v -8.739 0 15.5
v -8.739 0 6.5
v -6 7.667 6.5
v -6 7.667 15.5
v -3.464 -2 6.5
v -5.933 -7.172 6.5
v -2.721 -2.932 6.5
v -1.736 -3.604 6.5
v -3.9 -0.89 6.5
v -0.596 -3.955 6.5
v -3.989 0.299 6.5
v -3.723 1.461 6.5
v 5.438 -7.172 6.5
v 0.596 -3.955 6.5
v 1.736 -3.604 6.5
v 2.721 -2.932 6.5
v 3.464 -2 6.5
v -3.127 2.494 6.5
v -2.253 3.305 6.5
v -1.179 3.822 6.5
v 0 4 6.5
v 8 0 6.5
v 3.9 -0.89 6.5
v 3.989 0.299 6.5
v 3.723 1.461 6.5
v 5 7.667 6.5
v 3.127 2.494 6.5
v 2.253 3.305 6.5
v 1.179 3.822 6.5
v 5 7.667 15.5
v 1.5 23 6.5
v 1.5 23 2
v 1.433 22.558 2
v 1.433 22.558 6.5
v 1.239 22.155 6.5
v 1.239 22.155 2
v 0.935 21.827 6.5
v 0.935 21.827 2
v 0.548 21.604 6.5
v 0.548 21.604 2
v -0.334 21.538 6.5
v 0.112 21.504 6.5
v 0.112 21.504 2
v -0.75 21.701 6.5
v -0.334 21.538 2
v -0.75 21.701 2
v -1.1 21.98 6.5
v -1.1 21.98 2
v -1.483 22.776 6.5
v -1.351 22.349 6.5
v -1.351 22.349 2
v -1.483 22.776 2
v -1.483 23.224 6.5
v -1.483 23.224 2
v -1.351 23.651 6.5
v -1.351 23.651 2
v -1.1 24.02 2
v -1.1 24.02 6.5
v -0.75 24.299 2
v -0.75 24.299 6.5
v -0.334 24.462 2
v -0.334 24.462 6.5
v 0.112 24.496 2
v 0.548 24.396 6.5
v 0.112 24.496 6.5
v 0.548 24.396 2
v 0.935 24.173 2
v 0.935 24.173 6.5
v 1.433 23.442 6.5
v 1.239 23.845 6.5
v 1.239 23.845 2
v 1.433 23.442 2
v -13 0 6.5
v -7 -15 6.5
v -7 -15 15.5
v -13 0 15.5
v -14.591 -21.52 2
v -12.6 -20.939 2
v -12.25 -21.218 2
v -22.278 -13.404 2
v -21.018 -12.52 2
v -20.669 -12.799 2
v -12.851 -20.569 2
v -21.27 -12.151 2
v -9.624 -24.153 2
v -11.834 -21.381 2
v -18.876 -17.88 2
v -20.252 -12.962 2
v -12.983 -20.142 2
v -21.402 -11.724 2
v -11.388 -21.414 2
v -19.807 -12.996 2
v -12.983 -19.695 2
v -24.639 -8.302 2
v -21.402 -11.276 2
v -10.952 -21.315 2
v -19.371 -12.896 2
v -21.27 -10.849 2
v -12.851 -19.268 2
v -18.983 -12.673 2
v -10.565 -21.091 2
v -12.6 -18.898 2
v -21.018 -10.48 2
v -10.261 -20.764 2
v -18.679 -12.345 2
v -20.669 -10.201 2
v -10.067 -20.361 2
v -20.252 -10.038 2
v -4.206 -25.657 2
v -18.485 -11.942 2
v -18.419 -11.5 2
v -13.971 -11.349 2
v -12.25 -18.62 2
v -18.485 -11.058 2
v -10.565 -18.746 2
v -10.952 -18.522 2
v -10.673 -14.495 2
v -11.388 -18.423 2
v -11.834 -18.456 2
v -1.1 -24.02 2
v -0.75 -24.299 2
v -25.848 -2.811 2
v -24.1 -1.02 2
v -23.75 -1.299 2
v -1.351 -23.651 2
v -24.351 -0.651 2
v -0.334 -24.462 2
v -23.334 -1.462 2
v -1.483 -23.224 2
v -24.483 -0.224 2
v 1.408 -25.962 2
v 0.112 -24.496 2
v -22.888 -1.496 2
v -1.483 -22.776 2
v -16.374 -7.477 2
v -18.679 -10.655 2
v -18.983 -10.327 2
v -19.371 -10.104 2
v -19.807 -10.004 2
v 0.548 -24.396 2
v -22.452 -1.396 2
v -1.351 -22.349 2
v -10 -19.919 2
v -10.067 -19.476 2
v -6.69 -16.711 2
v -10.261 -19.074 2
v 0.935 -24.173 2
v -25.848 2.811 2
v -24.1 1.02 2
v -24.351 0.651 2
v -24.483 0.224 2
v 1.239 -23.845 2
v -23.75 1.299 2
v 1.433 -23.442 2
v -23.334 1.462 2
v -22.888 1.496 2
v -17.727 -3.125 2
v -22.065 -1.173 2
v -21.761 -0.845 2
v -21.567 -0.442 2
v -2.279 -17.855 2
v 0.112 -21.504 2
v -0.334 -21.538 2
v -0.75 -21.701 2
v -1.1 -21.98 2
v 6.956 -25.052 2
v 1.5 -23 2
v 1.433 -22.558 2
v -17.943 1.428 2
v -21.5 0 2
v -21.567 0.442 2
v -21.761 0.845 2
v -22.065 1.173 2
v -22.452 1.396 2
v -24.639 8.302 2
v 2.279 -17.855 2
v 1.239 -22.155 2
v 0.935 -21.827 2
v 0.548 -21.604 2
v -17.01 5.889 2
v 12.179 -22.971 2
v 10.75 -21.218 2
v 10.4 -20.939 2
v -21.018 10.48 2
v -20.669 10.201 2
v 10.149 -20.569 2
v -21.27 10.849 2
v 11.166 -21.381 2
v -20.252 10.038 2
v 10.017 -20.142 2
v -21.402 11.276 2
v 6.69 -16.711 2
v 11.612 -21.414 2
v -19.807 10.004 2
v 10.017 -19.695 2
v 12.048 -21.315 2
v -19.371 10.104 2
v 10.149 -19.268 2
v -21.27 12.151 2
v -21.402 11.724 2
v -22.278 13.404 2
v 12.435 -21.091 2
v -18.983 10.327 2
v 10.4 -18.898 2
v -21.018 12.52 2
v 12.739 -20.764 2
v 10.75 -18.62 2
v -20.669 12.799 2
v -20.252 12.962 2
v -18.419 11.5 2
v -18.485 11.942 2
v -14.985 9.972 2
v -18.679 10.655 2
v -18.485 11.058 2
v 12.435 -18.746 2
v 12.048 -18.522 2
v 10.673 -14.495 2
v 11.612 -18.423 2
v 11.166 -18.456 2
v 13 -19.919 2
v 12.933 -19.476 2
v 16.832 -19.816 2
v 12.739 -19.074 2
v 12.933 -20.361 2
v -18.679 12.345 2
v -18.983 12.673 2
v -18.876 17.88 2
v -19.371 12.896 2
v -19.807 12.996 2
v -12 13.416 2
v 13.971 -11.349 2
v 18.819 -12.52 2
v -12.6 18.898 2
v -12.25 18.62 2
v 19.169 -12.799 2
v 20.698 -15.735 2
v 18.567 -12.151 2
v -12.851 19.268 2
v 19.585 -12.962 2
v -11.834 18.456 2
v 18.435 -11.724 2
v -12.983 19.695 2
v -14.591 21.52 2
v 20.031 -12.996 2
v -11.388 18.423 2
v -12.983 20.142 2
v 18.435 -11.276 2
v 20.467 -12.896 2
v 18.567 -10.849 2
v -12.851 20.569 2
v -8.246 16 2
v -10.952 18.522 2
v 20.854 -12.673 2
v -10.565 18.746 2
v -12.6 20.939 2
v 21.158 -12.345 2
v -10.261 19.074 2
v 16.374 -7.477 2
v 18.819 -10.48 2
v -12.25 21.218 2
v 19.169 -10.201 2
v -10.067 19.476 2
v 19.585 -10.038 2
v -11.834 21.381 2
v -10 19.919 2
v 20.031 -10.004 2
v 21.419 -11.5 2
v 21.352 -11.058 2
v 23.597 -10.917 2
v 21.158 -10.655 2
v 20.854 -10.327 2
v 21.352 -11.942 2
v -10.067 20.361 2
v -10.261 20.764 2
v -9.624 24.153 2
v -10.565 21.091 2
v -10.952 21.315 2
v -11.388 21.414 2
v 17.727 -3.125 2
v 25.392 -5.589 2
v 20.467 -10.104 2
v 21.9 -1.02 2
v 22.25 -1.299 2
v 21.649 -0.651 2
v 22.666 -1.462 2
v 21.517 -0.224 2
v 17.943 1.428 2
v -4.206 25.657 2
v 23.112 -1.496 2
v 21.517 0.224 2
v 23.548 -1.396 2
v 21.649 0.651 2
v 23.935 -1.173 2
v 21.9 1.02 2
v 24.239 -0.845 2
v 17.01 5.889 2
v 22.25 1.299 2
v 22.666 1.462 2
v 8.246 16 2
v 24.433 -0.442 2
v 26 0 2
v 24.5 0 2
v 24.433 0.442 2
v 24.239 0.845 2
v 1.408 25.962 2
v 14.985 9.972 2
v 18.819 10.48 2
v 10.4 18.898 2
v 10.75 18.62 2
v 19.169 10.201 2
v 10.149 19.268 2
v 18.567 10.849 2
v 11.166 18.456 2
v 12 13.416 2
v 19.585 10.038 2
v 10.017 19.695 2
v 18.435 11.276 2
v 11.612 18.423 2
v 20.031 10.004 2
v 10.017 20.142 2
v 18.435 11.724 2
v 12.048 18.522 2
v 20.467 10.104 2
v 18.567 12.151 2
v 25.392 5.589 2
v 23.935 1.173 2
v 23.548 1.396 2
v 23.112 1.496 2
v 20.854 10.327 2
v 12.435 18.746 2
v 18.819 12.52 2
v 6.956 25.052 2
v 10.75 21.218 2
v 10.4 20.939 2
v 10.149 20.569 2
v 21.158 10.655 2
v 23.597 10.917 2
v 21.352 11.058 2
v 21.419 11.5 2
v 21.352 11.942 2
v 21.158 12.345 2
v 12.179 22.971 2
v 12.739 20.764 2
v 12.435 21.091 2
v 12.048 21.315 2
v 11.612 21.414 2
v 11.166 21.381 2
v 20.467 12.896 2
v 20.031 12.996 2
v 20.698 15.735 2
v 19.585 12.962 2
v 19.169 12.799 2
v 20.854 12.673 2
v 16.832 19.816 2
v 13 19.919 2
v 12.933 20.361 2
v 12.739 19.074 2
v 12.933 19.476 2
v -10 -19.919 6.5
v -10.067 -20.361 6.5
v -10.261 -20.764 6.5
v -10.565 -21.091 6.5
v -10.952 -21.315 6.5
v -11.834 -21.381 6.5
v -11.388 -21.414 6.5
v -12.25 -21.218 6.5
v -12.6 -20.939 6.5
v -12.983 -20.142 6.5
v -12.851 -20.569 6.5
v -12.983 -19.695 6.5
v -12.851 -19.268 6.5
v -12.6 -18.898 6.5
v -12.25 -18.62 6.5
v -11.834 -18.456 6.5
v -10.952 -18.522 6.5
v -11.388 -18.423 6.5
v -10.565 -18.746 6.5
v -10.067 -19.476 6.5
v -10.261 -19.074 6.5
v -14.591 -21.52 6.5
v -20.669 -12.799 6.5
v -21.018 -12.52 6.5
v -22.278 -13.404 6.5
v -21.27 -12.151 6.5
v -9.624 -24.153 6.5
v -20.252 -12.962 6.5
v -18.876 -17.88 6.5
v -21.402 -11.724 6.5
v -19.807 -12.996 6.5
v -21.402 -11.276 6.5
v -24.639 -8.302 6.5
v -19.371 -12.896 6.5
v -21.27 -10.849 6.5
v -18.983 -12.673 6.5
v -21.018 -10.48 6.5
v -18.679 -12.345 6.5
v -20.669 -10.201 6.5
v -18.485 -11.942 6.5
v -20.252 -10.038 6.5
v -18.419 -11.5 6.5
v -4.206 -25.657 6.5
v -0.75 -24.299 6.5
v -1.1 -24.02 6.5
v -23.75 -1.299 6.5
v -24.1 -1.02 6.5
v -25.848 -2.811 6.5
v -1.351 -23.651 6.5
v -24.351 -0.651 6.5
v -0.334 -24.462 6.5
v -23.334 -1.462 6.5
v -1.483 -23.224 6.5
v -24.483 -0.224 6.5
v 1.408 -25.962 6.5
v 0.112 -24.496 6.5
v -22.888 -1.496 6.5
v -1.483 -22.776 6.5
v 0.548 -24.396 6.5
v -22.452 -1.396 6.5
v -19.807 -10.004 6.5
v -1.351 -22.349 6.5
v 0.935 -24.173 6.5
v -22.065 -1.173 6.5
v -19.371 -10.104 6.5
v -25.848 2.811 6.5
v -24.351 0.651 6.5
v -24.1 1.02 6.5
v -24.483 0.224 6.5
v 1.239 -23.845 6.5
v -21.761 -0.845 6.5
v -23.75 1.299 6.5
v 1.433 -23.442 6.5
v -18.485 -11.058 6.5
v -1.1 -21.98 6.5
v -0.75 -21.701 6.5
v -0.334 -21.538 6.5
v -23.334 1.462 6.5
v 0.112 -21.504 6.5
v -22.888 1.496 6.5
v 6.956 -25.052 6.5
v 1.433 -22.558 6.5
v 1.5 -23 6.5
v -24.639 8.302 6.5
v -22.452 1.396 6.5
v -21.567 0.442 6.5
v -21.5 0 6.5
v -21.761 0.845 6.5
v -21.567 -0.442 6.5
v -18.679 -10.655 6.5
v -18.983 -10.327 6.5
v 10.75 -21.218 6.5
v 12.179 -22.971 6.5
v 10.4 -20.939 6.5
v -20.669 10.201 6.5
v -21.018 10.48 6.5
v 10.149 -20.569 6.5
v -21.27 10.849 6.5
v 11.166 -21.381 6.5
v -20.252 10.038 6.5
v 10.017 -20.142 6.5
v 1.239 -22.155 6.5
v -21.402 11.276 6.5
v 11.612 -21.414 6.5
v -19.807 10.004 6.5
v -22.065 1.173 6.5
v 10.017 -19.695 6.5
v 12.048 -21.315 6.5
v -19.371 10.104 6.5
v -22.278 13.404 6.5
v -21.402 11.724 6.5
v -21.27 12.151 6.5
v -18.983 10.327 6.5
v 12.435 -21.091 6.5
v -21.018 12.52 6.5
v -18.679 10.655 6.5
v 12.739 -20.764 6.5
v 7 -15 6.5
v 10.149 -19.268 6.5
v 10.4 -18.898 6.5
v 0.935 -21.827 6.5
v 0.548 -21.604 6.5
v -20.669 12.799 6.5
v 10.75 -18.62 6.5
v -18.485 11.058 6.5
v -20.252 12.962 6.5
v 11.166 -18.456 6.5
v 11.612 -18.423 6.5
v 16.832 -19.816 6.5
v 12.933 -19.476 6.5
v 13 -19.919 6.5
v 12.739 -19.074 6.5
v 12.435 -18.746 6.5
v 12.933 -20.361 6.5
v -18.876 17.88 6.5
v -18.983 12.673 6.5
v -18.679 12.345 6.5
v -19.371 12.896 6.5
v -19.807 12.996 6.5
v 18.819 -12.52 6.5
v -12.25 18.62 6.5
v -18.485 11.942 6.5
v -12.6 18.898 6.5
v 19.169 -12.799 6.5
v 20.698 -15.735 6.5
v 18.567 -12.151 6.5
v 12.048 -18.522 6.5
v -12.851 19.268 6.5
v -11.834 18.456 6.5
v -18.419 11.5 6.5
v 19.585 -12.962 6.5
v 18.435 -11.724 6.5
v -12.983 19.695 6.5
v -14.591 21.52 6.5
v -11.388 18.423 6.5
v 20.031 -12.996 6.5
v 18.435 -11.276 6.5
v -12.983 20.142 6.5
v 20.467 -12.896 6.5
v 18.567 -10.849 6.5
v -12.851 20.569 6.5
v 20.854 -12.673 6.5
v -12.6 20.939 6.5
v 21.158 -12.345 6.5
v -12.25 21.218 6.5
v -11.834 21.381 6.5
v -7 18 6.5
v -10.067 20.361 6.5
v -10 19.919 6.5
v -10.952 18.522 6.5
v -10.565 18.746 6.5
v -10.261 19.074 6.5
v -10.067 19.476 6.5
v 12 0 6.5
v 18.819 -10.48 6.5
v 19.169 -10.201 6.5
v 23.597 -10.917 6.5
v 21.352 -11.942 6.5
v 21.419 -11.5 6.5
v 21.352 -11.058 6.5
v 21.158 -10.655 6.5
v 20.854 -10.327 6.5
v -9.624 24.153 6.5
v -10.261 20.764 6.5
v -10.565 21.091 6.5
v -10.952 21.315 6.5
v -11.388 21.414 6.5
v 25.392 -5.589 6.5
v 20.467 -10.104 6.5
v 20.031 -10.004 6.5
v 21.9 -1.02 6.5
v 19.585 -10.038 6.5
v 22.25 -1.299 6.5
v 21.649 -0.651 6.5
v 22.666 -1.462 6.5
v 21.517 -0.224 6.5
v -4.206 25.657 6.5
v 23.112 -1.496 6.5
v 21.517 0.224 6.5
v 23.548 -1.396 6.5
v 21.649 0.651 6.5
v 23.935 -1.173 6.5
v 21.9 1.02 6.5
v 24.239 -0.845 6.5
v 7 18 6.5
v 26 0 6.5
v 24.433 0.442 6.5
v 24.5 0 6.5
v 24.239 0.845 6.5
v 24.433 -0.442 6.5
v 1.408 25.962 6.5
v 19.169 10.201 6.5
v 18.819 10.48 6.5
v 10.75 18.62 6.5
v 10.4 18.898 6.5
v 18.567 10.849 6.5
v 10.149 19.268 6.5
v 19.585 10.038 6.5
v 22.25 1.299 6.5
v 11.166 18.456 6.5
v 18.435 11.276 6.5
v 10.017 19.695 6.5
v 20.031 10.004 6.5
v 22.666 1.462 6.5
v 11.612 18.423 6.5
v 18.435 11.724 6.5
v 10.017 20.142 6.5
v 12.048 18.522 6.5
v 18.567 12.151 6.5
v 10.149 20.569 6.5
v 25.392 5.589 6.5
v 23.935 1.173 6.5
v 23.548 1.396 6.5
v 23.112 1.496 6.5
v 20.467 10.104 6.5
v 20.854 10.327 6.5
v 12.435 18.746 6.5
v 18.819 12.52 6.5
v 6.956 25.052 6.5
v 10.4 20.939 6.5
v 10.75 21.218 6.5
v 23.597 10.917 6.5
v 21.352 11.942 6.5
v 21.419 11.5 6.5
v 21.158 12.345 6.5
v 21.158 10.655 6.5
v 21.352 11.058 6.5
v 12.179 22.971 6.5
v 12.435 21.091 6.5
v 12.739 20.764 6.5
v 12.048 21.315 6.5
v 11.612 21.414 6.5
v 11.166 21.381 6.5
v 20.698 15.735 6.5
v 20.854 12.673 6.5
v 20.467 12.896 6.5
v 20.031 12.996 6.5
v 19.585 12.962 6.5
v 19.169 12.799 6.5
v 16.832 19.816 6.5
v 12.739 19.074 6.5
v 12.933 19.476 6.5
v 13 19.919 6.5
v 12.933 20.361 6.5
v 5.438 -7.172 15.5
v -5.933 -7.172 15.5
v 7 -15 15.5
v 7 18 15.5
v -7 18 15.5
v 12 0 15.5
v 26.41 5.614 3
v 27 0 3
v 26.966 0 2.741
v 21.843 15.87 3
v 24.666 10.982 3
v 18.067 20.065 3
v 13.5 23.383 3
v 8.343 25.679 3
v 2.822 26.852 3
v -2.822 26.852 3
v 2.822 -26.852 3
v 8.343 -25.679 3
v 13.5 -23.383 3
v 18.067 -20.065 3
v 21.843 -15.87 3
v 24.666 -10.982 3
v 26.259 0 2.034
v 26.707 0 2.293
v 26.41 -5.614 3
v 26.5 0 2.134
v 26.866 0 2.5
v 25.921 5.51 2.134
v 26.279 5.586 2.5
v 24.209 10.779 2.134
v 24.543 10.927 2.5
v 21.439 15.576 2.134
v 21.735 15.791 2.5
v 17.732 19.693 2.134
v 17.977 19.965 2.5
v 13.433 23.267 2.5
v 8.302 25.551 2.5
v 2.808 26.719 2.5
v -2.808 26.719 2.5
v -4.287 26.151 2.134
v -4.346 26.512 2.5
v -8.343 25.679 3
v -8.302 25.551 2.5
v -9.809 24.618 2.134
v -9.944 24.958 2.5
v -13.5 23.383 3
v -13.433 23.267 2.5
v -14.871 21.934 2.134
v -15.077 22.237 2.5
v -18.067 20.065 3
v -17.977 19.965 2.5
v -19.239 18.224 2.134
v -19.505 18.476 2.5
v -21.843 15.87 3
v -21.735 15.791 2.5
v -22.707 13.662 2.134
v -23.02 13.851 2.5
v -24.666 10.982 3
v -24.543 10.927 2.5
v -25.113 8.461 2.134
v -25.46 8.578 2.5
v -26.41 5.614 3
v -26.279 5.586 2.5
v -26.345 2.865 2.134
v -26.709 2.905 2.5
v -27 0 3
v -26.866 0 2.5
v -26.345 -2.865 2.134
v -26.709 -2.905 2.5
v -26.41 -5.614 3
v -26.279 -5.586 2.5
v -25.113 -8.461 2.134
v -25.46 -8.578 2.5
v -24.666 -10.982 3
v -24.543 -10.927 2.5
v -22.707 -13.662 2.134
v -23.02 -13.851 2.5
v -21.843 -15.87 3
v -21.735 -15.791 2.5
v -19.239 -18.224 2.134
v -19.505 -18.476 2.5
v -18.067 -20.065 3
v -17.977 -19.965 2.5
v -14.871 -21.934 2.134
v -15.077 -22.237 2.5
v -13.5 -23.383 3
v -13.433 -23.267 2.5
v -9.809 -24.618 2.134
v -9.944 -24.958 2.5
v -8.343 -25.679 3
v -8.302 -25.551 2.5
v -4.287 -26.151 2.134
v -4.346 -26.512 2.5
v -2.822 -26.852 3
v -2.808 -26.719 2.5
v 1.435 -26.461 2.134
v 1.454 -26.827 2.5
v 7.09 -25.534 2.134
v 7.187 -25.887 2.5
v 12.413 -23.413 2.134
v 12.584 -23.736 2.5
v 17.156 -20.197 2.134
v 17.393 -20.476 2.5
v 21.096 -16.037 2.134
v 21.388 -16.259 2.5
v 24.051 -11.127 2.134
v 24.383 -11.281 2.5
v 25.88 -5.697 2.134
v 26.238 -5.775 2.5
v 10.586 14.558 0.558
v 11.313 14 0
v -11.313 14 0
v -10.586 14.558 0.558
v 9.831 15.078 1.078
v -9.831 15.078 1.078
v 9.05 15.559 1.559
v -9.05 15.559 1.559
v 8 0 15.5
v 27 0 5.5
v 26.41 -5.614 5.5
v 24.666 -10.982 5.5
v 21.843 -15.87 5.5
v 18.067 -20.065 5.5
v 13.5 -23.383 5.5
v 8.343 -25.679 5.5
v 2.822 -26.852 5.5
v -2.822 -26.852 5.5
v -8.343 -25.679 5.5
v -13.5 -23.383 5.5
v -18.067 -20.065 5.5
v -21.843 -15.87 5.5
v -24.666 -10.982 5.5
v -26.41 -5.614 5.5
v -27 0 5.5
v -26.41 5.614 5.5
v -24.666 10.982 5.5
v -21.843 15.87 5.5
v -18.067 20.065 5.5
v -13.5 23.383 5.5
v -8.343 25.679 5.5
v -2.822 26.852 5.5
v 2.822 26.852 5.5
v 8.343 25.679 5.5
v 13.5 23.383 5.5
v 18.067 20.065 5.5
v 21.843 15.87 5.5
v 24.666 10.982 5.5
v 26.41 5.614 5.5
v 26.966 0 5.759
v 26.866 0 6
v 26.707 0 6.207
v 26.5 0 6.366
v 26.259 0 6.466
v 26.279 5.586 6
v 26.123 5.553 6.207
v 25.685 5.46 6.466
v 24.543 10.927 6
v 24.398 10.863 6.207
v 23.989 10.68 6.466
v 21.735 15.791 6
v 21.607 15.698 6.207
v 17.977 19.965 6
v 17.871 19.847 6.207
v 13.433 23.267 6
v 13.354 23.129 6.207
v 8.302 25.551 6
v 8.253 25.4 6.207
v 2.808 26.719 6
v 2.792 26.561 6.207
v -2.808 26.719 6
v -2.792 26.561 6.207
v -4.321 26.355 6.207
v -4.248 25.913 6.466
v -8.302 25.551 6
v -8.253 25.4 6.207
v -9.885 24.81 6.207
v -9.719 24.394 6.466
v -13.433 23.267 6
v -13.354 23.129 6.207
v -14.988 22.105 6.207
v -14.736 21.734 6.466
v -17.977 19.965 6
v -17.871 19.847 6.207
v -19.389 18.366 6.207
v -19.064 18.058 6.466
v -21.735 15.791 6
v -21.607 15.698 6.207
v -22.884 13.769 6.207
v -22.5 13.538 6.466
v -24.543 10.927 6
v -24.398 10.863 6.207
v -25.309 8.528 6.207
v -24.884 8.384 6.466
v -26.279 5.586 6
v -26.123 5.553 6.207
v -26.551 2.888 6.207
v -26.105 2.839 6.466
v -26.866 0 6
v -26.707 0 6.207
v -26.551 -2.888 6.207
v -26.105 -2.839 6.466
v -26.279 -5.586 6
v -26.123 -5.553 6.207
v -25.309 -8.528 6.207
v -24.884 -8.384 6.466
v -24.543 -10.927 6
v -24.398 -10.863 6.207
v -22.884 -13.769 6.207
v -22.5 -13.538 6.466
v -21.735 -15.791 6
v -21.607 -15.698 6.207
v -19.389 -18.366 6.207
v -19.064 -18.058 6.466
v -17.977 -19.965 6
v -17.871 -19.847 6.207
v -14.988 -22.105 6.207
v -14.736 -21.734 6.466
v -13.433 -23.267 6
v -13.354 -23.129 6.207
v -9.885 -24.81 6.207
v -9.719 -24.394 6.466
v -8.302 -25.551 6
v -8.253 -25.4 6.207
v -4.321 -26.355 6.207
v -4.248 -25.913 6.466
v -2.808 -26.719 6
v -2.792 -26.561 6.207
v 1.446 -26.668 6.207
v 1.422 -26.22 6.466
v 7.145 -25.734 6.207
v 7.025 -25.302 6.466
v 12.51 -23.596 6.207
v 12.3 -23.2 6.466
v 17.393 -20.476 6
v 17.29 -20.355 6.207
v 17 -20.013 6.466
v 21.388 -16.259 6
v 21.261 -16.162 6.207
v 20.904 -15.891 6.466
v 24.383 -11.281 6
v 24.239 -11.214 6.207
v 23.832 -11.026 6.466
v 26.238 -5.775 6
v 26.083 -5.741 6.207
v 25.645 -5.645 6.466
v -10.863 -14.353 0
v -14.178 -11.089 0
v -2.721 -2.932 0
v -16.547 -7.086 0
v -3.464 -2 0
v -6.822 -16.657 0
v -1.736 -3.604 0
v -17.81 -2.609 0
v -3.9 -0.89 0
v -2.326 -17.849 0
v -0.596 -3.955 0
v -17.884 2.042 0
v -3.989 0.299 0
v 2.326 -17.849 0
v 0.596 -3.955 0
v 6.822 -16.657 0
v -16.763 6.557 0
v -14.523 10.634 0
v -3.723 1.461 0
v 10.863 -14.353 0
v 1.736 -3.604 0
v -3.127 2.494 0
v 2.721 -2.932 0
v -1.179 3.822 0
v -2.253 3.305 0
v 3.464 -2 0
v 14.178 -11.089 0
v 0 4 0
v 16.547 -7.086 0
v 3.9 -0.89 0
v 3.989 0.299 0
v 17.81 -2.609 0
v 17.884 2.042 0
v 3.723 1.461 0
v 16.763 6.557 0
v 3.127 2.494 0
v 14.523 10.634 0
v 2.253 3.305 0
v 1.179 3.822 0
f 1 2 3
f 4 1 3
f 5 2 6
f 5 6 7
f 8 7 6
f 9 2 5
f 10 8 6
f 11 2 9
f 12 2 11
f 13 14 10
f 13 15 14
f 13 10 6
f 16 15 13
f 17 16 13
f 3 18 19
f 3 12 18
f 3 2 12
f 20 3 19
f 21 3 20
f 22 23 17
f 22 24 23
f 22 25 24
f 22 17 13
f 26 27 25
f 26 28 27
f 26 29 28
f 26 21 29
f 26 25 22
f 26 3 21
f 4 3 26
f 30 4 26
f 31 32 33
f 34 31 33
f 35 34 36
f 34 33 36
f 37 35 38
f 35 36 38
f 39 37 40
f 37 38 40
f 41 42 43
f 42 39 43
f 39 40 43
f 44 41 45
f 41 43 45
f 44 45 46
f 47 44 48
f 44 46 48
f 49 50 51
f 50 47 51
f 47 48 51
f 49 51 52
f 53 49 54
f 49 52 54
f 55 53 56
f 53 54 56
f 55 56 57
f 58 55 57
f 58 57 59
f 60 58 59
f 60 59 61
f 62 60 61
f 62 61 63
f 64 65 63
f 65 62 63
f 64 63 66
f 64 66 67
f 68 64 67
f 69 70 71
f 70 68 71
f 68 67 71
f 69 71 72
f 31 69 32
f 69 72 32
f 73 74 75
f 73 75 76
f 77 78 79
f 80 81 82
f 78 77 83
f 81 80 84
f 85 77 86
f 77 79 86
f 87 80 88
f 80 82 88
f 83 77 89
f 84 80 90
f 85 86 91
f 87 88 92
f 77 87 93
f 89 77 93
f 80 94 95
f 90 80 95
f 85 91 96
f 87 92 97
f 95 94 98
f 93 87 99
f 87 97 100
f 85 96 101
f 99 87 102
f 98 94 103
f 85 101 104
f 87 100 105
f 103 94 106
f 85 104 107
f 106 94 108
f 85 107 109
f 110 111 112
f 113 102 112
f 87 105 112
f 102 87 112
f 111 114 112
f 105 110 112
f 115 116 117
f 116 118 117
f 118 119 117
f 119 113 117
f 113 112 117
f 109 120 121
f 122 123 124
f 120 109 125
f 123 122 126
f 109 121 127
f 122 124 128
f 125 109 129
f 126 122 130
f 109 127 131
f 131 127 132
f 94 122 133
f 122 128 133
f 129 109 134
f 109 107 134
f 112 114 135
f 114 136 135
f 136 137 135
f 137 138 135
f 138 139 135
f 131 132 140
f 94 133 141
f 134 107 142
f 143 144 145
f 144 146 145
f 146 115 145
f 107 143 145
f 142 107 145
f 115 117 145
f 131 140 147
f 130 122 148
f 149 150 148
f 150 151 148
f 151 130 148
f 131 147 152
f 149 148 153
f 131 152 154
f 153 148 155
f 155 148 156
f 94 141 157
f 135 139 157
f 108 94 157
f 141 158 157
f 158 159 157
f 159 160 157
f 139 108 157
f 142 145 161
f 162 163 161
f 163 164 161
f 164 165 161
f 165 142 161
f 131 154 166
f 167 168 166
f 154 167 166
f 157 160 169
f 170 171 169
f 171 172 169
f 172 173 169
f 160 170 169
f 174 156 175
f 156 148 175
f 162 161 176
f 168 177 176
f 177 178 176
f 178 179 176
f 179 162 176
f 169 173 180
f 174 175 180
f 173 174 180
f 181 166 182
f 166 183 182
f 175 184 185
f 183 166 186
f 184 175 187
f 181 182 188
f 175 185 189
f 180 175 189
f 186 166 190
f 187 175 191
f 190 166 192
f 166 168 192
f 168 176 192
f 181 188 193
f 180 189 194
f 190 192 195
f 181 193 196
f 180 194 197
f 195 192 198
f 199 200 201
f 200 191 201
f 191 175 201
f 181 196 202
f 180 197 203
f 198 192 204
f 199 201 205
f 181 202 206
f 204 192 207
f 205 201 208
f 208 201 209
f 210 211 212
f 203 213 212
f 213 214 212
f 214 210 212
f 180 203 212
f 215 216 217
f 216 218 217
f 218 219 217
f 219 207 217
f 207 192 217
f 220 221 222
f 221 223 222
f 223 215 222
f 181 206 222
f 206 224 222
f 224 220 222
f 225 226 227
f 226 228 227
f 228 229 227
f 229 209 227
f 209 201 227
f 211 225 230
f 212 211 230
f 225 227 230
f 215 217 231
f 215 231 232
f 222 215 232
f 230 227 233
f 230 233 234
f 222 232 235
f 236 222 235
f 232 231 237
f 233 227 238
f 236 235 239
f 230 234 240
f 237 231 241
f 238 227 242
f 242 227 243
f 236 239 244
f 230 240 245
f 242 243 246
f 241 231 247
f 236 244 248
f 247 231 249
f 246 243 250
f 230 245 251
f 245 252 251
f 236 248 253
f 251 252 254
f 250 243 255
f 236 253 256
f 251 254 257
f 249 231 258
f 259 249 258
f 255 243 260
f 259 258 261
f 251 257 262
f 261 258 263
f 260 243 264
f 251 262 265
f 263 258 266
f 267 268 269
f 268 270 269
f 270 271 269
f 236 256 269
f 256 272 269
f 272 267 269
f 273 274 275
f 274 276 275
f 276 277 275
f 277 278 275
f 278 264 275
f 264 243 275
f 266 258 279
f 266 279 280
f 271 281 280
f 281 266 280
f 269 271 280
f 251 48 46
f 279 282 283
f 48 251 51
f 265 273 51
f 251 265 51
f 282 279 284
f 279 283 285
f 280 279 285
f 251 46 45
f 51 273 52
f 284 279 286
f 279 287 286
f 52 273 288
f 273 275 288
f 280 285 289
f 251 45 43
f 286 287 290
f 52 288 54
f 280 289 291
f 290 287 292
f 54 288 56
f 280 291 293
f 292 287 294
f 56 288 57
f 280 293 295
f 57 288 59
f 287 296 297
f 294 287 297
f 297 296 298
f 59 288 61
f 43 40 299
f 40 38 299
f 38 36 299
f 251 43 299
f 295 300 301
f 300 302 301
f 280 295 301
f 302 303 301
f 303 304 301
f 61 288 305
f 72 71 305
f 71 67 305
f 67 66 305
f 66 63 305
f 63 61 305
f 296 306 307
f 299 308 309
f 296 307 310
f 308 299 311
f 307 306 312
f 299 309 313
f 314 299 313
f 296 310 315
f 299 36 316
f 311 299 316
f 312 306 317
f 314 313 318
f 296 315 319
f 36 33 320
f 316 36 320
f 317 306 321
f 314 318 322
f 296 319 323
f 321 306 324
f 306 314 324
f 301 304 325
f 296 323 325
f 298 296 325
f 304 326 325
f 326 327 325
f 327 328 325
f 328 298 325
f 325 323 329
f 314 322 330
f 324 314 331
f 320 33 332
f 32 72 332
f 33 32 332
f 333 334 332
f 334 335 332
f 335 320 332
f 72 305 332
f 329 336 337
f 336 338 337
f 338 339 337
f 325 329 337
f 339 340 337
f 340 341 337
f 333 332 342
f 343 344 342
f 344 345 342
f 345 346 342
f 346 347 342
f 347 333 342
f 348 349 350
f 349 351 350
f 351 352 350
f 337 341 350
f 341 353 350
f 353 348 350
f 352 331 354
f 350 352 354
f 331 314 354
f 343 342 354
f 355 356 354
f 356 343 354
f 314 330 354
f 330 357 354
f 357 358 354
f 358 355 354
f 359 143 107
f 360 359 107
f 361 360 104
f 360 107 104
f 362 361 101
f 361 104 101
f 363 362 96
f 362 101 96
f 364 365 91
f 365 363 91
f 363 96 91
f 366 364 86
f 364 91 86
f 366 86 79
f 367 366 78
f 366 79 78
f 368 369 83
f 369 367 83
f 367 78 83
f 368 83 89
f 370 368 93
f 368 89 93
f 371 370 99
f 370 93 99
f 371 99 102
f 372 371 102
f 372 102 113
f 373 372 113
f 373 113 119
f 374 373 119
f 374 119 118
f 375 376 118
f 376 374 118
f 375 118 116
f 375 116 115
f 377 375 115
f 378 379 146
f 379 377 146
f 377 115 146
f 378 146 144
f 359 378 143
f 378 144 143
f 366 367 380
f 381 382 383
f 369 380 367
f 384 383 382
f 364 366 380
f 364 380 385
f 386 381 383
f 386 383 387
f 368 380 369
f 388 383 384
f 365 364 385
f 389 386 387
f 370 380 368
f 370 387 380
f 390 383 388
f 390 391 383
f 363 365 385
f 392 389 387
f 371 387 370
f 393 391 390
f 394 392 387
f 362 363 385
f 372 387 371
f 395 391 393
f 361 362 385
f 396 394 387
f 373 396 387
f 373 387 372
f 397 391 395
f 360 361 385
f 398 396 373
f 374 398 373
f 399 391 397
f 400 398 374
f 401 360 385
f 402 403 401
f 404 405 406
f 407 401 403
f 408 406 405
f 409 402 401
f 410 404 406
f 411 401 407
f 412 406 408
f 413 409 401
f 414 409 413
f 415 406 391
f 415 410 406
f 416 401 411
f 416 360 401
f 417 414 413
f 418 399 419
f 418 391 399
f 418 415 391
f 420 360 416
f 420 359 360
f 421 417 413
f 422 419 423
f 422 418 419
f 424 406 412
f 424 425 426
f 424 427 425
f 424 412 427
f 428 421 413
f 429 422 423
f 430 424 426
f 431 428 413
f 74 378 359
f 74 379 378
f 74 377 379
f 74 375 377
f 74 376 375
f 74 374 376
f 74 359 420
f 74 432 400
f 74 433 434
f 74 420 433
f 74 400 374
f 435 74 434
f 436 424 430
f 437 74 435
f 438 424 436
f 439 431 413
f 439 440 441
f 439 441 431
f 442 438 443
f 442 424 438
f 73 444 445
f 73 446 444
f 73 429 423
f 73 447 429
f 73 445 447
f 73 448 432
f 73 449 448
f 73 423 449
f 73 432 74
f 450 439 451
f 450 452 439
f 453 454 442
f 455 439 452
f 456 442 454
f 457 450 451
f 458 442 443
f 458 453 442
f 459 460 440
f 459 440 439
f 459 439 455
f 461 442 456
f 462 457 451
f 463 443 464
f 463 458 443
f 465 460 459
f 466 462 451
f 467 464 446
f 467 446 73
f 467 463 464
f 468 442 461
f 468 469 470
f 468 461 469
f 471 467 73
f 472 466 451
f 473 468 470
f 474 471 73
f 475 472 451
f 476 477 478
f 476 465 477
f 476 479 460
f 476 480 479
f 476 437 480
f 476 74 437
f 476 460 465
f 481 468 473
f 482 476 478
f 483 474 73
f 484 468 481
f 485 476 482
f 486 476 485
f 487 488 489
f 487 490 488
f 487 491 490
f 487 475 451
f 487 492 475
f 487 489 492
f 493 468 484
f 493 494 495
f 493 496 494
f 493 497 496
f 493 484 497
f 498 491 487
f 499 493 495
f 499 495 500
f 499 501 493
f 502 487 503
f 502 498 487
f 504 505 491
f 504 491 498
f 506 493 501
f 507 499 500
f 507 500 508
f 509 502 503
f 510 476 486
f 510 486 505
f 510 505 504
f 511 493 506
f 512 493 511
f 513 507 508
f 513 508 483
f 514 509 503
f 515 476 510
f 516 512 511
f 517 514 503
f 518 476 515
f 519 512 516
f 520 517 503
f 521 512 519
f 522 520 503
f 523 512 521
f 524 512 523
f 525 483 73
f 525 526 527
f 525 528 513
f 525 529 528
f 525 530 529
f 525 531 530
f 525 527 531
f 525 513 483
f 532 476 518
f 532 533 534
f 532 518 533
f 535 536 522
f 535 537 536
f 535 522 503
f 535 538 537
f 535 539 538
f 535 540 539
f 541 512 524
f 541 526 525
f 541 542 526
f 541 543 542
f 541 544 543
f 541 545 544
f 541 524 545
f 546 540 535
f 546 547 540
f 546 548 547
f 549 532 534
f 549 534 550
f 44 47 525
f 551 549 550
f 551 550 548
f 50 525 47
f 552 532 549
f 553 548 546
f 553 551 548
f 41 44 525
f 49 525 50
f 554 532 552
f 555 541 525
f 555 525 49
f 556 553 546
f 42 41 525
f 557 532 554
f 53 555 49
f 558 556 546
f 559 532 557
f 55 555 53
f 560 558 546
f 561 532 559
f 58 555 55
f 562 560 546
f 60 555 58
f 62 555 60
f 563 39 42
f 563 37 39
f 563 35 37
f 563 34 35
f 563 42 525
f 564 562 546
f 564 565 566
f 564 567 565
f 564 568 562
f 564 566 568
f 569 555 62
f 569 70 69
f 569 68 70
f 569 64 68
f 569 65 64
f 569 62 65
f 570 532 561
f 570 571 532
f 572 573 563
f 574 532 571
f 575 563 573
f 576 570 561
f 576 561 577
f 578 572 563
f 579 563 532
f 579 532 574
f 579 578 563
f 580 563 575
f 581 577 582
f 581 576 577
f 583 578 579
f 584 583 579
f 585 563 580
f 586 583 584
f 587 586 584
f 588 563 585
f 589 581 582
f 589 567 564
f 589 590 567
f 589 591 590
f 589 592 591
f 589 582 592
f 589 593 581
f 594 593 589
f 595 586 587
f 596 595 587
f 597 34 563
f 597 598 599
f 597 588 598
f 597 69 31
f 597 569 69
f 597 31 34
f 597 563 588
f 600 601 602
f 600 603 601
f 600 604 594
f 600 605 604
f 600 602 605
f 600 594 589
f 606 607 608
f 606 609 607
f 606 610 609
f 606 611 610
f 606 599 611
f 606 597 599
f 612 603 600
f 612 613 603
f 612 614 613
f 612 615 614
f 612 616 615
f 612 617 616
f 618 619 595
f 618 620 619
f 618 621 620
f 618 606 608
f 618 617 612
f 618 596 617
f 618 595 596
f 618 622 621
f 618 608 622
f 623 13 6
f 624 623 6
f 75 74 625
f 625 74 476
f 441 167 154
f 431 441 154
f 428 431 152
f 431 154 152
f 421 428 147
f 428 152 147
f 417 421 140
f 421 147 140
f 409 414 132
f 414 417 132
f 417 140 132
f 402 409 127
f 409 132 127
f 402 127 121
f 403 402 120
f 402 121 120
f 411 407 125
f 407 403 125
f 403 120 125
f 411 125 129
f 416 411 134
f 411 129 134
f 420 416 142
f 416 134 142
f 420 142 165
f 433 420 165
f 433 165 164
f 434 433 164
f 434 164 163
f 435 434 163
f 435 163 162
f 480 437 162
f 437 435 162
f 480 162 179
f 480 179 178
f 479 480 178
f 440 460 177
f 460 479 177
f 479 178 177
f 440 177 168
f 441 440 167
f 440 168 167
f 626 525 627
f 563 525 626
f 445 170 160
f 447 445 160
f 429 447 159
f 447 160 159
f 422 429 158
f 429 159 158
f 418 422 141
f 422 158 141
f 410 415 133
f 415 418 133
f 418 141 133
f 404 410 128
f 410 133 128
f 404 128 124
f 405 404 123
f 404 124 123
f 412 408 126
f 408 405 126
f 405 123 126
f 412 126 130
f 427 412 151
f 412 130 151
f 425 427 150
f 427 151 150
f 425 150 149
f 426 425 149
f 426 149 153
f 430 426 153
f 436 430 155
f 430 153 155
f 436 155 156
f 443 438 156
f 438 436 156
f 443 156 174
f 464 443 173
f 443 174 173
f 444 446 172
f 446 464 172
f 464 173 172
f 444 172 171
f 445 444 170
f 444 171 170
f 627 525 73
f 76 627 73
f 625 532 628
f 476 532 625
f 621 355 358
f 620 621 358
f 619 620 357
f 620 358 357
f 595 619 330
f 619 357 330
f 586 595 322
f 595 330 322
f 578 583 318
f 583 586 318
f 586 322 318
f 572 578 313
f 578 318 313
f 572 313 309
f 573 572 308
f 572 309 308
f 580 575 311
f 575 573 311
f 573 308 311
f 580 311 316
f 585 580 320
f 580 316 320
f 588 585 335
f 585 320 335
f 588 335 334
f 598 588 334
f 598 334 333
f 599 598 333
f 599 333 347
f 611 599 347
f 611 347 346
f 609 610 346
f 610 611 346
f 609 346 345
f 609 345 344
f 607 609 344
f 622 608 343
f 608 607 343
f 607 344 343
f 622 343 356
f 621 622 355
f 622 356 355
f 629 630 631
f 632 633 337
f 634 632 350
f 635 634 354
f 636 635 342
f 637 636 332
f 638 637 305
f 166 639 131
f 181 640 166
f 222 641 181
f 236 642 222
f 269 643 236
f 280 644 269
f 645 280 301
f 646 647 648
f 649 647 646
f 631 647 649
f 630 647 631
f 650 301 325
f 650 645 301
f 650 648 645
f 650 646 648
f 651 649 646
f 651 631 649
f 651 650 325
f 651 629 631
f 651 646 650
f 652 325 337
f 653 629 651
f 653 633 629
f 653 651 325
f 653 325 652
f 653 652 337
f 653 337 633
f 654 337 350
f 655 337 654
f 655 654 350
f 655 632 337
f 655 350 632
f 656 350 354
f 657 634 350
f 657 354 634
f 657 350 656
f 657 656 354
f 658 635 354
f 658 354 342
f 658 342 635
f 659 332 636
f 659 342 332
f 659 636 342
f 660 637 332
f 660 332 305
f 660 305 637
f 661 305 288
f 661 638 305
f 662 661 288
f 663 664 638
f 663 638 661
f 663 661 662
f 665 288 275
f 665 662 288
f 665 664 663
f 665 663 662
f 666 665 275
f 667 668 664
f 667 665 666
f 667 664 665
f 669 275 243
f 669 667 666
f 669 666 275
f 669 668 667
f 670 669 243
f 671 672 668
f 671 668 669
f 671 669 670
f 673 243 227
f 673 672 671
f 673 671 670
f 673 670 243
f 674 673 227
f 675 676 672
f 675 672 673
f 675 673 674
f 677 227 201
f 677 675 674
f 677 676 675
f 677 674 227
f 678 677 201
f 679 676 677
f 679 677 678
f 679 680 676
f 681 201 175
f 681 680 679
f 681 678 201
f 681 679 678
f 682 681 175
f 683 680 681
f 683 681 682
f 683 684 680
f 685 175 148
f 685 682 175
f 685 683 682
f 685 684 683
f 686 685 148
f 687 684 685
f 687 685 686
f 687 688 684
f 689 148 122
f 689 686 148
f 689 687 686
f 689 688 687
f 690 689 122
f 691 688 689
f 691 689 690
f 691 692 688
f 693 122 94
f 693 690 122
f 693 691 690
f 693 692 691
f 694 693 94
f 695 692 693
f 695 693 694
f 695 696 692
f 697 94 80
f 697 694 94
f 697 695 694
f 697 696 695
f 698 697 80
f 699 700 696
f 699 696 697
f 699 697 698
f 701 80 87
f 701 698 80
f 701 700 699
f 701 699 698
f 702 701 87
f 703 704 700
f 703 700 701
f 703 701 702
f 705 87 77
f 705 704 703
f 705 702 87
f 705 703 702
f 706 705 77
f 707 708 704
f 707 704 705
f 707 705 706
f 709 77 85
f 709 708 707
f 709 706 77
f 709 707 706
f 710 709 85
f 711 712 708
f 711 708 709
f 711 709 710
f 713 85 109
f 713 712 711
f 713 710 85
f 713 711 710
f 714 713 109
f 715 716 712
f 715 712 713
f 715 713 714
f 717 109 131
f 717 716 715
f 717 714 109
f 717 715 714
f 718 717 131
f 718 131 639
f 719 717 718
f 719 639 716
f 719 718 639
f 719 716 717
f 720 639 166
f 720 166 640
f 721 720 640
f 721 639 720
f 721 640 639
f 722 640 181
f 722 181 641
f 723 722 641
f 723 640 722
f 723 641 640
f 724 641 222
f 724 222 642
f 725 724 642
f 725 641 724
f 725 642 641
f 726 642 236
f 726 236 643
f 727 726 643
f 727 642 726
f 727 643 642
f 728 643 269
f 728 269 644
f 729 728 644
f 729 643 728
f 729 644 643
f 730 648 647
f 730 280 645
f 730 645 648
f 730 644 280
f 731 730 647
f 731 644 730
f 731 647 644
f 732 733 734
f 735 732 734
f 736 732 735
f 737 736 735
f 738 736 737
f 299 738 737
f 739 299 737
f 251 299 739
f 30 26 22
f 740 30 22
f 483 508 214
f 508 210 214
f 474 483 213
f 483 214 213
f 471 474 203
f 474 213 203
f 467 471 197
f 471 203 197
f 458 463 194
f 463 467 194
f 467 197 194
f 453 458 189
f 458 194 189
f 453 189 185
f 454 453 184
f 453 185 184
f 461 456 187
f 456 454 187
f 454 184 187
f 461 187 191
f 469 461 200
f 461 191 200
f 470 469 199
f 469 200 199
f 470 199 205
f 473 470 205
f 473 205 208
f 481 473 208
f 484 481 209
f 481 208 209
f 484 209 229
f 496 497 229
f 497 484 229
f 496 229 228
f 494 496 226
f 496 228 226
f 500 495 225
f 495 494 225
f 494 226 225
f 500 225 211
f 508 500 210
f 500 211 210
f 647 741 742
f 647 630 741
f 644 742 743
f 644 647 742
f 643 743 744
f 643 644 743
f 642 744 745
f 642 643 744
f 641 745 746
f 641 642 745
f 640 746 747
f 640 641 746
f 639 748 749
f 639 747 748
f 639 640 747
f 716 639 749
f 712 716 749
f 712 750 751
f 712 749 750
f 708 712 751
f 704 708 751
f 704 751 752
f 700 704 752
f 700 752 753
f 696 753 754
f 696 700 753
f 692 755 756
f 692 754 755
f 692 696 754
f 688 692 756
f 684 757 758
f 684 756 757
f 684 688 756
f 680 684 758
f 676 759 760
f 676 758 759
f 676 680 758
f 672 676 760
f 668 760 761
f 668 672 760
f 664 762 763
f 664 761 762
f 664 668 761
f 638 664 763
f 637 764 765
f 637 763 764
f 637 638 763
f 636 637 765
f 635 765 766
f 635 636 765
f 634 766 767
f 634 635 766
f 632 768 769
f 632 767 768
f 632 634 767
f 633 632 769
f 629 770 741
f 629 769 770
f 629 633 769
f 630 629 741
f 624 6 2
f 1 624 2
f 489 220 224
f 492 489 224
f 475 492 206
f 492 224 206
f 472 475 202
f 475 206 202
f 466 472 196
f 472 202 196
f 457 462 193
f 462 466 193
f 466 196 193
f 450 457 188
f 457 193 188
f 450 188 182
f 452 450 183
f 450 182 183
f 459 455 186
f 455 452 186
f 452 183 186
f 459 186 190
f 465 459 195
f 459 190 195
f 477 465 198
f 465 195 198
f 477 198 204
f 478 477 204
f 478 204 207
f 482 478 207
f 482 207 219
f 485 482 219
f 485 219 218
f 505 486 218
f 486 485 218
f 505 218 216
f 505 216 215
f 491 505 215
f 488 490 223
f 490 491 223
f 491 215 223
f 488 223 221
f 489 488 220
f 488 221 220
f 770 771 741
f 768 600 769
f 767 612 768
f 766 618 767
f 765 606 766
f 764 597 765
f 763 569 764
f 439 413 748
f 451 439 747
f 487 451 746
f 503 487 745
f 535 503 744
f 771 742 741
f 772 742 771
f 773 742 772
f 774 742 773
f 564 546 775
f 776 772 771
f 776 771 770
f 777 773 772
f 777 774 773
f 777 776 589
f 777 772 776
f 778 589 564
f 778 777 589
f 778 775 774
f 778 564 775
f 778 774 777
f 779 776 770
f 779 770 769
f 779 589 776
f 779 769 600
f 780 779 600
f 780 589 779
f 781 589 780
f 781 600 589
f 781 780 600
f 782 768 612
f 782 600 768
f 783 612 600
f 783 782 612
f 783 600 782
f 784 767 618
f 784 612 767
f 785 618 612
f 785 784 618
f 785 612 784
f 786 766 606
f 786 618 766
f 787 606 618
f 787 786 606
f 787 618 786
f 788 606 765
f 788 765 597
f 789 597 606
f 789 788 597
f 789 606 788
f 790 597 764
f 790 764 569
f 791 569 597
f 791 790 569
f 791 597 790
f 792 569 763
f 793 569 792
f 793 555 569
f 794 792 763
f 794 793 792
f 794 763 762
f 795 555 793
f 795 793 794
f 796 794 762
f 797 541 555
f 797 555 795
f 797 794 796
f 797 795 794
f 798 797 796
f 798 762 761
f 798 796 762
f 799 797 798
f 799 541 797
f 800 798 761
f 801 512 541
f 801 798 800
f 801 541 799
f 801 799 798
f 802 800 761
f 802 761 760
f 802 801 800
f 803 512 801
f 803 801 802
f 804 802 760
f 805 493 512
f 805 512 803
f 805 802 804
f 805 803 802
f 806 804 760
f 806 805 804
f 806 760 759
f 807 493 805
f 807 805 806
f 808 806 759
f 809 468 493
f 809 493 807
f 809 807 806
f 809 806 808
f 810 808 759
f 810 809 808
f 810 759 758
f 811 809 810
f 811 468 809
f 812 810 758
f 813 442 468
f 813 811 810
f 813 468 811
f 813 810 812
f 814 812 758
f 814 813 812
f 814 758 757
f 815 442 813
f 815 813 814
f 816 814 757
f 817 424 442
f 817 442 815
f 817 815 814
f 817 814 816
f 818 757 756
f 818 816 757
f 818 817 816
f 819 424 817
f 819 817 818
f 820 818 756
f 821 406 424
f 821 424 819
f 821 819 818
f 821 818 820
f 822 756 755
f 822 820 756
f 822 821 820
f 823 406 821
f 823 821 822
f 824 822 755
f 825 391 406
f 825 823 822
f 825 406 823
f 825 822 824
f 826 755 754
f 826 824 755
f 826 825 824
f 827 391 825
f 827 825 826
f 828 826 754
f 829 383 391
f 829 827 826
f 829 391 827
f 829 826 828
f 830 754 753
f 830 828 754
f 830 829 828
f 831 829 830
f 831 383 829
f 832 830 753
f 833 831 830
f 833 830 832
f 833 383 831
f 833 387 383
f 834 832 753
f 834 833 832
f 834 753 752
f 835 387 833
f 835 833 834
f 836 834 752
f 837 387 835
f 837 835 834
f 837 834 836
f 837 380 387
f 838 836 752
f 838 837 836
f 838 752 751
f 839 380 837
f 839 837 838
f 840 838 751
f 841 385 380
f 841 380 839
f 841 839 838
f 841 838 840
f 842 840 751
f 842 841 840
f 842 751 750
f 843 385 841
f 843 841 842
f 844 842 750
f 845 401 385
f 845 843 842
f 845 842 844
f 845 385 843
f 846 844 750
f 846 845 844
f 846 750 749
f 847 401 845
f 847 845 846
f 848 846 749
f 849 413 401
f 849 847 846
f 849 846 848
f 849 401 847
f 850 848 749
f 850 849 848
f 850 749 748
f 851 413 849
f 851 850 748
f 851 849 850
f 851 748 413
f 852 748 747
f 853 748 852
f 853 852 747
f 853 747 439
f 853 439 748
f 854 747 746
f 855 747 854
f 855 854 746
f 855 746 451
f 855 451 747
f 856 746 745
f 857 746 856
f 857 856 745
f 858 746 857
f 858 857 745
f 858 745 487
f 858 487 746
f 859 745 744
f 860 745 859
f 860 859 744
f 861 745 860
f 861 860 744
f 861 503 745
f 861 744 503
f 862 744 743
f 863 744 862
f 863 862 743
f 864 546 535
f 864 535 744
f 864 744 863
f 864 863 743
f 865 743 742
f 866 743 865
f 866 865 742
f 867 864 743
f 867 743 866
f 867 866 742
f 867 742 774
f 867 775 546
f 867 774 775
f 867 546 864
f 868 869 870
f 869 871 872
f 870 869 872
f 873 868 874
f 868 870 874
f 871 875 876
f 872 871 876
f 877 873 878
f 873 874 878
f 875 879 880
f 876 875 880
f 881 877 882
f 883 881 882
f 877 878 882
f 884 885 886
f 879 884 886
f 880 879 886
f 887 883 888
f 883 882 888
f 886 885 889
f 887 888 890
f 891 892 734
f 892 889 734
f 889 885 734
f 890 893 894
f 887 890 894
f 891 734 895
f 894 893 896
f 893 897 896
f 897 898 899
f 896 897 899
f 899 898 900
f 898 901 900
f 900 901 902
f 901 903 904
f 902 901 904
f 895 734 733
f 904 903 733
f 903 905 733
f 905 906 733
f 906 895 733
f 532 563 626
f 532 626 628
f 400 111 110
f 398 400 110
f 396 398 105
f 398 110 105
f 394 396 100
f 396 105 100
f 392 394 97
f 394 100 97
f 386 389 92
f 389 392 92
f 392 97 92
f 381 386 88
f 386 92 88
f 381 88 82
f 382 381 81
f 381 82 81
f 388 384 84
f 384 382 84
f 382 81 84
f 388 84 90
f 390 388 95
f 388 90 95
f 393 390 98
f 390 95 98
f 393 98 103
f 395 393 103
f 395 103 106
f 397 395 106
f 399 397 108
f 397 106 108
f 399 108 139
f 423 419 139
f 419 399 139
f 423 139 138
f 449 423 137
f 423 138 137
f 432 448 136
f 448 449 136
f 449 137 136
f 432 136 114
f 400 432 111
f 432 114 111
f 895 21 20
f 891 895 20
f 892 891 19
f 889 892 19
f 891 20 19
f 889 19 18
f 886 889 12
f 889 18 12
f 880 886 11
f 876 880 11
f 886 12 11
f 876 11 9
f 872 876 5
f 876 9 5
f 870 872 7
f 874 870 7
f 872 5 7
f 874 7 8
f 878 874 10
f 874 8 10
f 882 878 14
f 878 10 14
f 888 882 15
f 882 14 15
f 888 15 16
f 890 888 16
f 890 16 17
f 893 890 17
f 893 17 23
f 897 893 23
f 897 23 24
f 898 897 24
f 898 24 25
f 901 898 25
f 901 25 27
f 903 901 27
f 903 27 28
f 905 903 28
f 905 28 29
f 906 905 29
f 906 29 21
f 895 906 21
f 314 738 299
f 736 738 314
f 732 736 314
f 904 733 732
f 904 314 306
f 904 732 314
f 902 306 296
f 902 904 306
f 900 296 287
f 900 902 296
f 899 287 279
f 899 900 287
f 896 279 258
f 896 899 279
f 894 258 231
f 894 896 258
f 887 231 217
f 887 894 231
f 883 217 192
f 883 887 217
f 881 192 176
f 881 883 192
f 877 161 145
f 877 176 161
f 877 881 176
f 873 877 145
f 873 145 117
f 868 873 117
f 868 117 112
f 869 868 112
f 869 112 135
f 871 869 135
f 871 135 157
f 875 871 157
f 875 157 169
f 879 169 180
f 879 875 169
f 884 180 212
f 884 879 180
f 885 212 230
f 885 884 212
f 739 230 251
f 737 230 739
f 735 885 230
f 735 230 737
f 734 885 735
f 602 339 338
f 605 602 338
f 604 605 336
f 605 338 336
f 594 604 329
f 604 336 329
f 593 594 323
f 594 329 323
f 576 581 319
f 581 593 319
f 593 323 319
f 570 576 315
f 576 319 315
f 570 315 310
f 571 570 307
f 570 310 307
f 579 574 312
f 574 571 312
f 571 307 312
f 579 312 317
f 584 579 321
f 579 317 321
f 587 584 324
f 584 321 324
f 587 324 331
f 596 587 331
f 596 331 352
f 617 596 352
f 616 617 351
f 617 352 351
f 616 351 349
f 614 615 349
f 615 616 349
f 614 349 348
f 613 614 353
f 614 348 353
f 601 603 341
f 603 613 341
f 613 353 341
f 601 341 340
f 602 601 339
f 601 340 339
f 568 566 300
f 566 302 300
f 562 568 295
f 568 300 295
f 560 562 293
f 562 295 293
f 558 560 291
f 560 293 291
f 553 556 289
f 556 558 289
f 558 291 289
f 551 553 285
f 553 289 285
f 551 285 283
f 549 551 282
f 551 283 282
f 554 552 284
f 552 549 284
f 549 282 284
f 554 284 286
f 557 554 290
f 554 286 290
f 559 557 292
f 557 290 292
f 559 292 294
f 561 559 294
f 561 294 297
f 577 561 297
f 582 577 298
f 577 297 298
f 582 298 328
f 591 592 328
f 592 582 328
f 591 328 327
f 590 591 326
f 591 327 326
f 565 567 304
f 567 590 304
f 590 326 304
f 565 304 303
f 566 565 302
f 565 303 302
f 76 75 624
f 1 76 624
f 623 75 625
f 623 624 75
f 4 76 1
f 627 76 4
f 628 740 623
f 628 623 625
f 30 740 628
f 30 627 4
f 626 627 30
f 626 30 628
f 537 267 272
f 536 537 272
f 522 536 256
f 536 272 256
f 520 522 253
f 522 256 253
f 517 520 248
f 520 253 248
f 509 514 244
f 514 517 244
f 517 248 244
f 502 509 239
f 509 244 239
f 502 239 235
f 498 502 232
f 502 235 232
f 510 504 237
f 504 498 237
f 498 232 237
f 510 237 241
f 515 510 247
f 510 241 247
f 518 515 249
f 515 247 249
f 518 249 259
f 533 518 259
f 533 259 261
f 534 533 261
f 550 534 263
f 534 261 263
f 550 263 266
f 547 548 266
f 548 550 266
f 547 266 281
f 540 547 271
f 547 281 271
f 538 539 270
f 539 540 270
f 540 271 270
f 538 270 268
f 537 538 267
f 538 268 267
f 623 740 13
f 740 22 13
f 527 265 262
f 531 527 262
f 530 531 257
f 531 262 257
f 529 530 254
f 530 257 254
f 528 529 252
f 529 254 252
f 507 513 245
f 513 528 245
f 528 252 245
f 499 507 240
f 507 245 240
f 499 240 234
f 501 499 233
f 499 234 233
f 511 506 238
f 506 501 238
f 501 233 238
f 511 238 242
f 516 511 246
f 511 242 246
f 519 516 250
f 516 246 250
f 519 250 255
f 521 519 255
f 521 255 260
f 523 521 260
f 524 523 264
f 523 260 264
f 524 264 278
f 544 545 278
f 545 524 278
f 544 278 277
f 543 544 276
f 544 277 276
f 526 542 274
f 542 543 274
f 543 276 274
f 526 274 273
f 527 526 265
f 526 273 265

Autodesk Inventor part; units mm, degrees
ref_plane "YZ Plane" through (0, 0, 0) normal (1, 0, 0) x (0, 1, 0)
ref_plane "XZ Plane" through (0, 0, 0) normal (0, 1, 0) x (-1, 0, 0)
ref_plane "XY Plane" through (0, 0, 0) normal (0, 0, 1) x (1, 0, 0)
sketch "Sketch1" plane through (0, 0, 0) normal (0, 0, 1) x (1, 0, 0)
  arc A0 (-8.2462, 16) -> (8.2462, 16) centre (0, 0) ccw
  line L0 (-8.2462, 16) -> (8.2462, 16)
  dimension "d0" = 36
  dimension "d1" = 16
extrude "Extrusion1" add sketch "Sketch1" along normal blind 2
sketch "Sketch2" plane through (0, 0, 2) normal (0, 0, 1) x (1, 0, 0)
  circle A0 centre (0, 0) radius 27
  circle A1 centre (0, 0) radius 23 construction
  line L0 (0, 27) -> (0, -27) construction
  line L1 (-27, 0) -> (27, 0) construction
  line L2 (8.2462, 16) -> (-8.2462, 16) projected
  line L3 (8.2462, 16) -> (-8.2462, 16) projected
  arc A2 (-8.2462, 16) -> (8.2462, 16) centre (0, 0) ccw projected
  circle A3 centre (0, 23) radius 1.5
  circle A4 centre (11.5, 19.9186) radius 1.5
  circle A5 centre (19.9186, 11.5) radius 1.5
  circle A6 centre (23, 0) radius 1.5
  circle A7 centre (19.9186, -11.5) radius 1.5
  circle A8 centre (11.5, -19.9186) radius 1.5
  circle A9 centre (0, -23) radius 1.5
  circle A10 centre (-11.5, -19.9186) radius 1.5
  circle A11 centre (-19.9186, -11.5) radius 1.5
  circle A12 centre (-23, 0) radius 1.5
  circle A13 centre (-19.9186, 11.5) radius 1.5
  circle A14 centre (-11.5, 19.9186) radius 1.5
  dimension "d5" = 46
  dimension "d4" = 54
  dimension "d6" = 3
  dimension "d9" = 360
extrude "Extrusion2" add sketch "Sketch2" along normal blind 4.5 contours A0 | A2 L2
chamfer "Chamfer1" distance 2 angle 45 1 edges at (0, 16, 0)
fillet "Fillet1" radius 1 2 edges at (-27, 0, 2) (-27, 0, 6.5)
sketch "Sketch3" plane through (0, 0, 0) normal (0, 0, -1) x (-1, 0, 0)
  circle A0 centre (0, 0) radius 7
  dimension "d17" = 14
hole "Hole1" at (0, 0, 0) direction (0, 0, 1) diameter 8 end through all
sketch "Sketch4" plane through (0, 0, 6.5) normal (0, 0, 1) x (1, 0, 0)
  line L0 (0, 0) -> (0, 31) construction
  line L1 (-7, 18) -> (7, 18)
  line L2 (-7, 18) -> (-13, 0)
  line L3 (0, 0) -> (0, -27) construction
  line L4 (-7, -15) -> (7, -15)
  line L5 (-7, -15) -> (-13, 0)
  line L6 (7, 18) -> (12, 0)
  line L7 (12, 0) -> (7, -15)
  line L8 (-6, 7.6667) -> (5, 7.6667)
  line L9 (5, 7.6667) -> (8, 0)
  line L10 (8, 0) -> (5.4377, -7.1718)
  line L11 (5.4377, -7.1718) -> (-5.9328, -7.1718)
  line L12 (-5.9328, -7.1718) -> (-8.7391, 0)
  line L13 (-8.7391, 0) -> (-6, 7.6667)
  point P0 (0, 18)
  dimension "d27" = 14
  dimension "d28" = 14
  dimension "d31" = 11
extrude "Extrusion4" add sketch "Sketch4" along normal blind 9
properties part number "1-26"
